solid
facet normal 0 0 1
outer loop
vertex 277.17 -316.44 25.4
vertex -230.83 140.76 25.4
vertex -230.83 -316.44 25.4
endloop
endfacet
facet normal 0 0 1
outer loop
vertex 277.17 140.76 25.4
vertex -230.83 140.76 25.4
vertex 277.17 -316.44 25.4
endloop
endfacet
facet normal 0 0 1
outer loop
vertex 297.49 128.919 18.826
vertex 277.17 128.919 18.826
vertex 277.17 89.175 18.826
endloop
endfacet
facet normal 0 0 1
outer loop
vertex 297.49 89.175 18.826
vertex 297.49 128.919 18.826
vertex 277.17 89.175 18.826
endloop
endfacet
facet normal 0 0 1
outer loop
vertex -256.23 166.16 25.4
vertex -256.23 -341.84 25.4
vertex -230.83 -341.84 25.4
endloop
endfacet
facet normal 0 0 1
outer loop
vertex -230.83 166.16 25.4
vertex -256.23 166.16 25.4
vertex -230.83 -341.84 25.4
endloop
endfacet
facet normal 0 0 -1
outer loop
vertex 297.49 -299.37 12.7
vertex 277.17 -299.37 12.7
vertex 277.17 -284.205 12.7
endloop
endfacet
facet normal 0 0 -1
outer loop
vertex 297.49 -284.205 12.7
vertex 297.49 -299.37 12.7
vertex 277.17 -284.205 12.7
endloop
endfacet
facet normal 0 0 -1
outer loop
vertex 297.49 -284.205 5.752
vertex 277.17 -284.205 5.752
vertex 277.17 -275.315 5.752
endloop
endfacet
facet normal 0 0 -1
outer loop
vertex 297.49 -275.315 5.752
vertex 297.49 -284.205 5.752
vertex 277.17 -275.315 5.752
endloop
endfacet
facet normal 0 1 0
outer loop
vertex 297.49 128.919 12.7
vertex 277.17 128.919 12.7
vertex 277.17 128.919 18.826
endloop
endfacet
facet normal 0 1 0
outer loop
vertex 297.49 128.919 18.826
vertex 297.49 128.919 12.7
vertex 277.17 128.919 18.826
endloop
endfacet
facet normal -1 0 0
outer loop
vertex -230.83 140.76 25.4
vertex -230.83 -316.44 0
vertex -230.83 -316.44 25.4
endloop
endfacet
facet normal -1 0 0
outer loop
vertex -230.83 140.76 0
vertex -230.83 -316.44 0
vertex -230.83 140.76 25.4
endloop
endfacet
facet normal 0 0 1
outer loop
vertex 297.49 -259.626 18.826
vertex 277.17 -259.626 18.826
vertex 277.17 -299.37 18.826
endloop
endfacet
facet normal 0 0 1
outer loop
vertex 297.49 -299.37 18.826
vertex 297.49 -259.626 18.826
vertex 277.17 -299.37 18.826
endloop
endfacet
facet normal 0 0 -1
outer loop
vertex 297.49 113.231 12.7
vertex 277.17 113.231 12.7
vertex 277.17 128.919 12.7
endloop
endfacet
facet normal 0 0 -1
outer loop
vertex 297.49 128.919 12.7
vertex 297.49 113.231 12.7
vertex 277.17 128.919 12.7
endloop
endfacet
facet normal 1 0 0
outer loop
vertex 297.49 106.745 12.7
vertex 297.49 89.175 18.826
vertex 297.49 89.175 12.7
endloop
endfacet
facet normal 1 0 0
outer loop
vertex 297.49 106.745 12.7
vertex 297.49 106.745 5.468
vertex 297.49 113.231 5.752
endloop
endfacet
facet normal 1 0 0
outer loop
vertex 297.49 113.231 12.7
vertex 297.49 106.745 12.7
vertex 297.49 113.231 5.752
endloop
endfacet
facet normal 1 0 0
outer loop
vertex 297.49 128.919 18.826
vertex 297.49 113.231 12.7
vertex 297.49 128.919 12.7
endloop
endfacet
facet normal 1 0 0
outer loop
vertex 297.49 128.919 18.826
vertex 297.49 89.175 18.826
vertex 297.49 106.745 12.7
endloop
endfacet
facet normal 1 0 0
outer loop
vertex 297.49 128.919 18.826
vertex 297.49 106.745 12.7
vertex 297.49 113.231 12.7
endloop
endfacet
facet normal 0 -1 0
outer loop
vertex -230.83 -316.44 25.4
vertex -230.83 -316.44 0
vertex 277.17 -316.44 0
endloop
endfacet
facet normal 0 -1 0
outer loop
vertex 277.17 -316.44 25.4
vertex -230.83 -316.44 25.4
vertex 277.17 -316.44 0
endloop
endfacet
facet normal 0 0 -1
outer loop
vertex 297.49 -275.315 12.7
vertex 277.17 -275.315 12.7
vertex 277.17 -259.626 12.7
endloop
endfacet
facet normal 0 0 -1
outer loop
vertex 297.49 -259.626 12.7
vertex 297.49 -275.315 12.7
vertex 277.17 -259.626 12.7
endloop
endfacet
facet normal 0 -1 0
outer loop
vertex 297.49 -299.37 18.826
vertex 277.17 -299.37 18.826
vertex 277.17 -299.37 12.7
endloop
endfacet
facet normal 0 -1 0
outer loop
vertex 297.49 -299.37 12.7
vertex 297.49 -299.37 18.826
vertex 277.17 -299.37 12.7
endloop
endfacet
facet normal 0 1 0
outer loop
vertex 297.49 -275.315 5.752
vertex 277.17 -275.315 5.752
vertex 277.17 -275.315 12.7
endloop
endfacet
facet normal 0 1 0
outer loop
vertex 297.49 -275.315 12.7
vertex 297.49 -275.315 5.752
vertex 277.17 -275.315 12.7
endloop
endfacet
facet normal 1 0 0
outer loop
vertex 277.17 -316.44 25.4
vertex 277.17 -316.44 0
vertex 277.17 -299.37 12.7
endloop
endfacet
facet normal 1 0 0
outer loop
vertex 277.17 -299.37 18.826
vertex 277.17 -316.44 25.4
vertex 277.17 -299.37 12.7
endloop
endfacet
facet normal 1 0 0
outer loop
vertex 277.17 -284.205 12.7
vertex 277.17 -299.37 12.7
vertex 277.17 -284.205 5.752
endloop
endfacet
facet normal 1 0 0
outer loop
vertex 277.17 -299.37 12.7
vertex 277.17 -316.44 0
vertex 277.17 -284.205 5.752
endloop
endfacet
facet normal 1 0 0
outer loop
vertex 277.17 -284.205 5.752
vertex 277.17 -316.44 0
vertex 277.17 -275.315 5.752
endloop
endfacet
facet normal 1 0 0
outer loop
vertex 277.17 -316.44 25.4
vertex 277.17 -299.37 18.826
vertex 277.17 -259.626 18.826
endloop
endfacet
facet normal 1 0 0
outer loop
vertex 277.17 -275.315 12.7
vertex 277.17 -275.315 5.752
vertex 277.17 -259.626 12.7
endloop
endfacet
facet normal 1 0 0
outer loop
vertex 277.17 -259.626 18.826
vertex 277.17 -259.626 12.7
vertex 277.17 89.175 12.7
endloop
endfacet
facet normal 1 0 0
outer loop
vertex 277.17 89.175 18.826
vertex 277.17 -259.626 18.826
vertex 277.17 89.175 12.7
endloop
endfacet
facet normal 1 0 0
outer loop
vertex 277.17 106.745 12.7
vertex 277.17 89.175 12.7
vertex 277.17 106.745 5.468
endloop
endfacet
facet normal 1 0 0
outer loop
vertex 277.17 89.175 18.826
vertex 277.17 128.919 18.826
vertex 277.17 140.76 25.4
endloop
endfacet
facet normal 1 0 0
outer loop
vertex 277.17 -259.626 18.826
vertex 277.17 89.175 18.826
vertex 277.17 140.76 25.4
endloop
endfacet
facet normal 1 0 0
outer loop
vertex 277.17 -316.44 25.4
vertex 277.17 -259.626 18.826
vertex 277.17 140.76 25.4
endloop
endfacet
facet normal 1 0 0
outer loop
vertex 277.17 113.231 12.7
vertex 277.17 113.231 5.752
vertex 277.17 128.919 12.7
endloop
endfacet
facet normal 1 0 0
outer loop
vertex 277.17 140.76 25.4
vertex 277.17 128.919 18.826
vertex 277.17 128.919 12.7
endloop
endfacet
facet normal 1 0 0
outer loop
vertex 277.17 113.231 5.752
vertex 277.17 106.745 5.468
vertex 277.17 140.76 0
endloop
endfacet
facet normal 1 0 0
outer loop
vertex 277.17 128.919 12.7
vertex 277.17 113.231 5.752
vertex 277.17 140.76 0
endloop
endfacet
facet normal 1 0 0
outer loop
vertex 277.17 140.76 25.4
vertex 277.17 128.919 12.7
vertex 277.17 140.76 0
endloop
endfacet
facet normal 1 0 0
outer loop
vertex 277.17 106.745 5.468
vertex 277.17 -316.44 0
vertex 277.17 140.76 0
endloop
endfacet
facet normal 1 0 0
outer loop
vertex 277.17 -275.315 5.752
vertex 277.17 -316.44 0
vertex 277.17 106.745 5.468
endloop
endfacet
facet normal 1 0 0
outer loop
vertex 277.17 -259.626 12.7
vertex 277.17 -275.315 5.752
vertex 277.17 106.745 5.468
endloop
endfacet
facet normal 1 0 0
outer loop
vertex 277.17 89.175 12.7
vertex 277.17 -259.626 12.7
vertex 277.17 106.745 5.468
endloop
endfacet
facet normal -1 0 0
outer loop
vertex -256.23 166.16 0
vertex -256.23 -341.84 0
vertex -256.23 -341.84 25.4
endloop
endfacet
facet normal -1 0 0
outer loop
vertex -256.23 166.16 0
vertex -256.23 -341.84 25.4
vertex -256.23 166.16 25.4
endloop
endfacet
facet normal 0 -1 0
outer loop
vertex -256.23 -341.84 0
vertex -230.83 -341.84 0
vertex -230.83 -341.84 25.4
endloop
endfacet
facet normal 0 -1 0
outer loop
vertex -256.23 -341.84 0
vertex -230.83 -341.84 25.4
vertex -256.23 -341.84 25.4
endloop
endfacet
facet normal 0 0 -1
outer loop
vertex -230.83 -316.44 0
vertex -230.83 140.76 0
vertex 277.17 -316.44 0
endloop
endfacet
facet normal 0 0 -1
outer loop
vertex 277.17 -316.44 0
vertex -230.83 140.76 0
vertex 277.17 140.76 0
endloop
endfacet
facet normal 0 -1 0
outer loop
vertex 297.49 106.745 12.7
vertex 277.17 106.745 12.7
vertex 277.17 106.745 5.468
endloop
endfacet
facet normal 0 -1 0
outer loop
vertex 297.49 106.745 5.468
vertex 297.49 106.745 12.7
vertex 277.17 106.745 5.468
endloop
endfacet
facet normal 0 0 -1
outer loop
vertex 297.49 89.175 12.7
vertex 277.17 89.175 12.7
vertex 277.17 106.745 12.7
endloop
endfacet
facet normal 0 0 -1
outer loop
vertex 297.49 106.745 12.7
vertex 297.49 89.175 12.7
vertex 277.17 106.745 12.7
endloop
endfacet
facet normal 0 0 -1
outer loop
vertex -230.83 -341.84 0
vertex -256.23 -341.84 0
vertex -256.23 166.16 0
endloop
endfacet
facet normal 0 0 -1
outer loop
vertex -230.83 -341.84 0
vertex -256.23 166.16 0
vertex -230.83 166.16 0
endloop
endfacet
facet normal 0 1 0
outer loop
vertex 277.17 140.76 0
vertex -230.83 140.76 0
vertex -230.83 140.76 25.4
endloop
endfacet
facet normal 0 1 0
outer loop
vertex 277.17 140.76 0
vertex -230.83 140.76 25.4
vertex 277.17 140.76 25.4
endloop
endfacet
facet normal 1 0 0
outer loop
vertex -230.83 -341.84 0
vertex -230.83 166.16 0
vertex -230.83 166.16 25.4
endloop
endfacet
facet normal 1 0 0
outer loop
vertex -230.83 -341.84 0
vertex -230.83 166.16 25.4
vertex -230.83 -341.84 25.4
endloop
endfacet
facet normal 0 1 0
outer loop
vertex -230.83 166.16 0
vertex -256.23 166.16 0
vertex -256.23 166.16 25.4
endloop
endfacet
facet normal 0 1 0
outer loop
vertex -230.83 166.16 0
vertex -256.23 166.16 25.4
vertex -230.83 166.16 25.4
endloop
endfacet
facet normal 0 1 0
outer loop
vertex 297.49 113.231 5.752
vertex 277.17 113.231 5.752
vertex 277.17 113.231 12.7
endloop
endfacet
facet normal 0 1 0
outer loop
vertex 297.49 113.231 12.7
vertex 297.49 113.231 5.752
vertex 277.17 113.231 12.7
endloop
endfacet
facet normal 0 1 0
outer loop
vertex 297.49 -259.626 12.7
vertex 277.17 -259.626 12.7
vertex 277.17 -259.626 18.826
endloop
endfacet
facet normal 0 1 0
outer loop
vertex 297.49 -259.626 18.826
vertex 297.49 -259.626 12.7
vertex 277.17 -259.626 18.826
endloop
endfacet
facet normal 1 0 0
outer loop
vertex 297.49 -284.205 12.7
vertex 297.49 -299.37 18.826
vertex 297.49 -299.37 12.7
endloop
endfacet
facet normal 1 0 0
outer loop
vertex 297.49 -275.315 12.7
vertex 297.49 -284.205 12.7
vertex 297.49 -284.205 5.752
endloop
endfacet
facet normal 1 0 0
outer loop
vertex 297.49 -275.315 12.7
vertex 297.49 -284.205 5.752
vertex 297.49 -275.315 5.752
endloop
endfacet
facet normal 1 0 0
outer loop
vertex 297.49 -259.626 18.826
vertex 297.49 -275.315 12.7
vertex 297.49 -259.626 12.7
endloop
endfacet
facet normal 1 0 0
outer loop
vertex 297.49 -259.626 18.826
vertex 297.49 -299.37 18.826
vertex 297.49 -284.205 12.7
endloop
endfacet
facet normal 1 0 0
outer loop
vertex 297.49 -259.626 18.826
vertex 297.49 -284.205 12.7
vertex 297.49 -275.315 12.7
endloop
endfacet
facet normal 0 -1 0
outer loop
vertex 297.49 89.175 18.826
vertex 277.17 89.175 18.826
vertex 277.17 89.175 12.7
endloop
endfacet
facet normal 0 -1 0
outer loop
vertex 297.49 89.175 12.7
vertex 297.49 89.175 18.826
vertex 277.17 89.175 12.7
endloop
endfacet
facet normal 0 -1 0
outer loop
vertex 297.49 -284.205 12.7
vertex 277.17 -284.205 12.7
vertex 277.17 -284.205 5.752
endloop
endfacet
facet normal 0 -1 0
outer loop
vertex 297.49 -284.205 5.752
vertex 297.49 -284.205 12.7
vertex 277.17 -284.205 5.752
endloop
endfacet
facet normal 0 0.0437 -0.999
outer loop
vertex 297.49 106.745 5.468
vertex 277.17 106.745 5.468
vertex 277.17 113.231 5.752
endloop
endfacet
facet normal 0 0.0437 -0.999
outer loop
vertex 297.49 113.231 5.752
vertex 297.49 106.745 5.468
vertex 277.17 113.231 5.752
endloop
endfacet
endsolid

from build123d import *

# Parameters (mm, degrees)
F0_W     = 508
F0_H     = 457.2
F1_DEPTH = 25.4
F3_DEPTH = 25.4
F5_DEPTH = 20.32


with BuildPart() as f1:
    # F0 (on Top) → F1 (new body)
    with BuildSketch(Plane.XY):
        with Locations((23.170052, -87.840116)):
            Rectangle(F0_W, F0_H)
    extrude(amount=F1_DEPTH)

    # F4 (on face) → F5 (join)
    with BuildSketch(Plane.YZ.offset(277.170052)):
        Polygon((-259.626299, 18.825883), (-299.369812, 18.825883), (-299.369812, 12.7), (-284.204543, 12.7), (-284.204543, 5.752353), (-275.31454, 5.752353), (-275.31454, 12.7), (-259.626299, 12.7), align=None)
        Polygon((89.175463, 18.825883), (89.175463, 12.7), (106.74534, 12.7), (106.74534, 5.46798), (113.230765, 5.752353), (113.230765, 12.7), (128.919005, 12.7), (128.919005, 18.825883), align=None)
    extrude(amount=F5_DEPTH)


with BuildPart() as f3:
    # F2 (on face) → F3 (new body, through all)
    with BuildSketch(Plane(origin=(0, 0, 0), x_dir=(1, 0, 0), z_dir=(0, 0, -1))):
        Polygon((-230.829948, 316.440116), (-230.829948, 341.840116), (-256.229948, 341.840116), (-256.229948, -166.159884), (-230.829948, -166.159884), (-230.829948, -140.759884), align=None)
    extrude(amount=-F3_DEPTH)


solid = Compound([f1.part, f3.part])
